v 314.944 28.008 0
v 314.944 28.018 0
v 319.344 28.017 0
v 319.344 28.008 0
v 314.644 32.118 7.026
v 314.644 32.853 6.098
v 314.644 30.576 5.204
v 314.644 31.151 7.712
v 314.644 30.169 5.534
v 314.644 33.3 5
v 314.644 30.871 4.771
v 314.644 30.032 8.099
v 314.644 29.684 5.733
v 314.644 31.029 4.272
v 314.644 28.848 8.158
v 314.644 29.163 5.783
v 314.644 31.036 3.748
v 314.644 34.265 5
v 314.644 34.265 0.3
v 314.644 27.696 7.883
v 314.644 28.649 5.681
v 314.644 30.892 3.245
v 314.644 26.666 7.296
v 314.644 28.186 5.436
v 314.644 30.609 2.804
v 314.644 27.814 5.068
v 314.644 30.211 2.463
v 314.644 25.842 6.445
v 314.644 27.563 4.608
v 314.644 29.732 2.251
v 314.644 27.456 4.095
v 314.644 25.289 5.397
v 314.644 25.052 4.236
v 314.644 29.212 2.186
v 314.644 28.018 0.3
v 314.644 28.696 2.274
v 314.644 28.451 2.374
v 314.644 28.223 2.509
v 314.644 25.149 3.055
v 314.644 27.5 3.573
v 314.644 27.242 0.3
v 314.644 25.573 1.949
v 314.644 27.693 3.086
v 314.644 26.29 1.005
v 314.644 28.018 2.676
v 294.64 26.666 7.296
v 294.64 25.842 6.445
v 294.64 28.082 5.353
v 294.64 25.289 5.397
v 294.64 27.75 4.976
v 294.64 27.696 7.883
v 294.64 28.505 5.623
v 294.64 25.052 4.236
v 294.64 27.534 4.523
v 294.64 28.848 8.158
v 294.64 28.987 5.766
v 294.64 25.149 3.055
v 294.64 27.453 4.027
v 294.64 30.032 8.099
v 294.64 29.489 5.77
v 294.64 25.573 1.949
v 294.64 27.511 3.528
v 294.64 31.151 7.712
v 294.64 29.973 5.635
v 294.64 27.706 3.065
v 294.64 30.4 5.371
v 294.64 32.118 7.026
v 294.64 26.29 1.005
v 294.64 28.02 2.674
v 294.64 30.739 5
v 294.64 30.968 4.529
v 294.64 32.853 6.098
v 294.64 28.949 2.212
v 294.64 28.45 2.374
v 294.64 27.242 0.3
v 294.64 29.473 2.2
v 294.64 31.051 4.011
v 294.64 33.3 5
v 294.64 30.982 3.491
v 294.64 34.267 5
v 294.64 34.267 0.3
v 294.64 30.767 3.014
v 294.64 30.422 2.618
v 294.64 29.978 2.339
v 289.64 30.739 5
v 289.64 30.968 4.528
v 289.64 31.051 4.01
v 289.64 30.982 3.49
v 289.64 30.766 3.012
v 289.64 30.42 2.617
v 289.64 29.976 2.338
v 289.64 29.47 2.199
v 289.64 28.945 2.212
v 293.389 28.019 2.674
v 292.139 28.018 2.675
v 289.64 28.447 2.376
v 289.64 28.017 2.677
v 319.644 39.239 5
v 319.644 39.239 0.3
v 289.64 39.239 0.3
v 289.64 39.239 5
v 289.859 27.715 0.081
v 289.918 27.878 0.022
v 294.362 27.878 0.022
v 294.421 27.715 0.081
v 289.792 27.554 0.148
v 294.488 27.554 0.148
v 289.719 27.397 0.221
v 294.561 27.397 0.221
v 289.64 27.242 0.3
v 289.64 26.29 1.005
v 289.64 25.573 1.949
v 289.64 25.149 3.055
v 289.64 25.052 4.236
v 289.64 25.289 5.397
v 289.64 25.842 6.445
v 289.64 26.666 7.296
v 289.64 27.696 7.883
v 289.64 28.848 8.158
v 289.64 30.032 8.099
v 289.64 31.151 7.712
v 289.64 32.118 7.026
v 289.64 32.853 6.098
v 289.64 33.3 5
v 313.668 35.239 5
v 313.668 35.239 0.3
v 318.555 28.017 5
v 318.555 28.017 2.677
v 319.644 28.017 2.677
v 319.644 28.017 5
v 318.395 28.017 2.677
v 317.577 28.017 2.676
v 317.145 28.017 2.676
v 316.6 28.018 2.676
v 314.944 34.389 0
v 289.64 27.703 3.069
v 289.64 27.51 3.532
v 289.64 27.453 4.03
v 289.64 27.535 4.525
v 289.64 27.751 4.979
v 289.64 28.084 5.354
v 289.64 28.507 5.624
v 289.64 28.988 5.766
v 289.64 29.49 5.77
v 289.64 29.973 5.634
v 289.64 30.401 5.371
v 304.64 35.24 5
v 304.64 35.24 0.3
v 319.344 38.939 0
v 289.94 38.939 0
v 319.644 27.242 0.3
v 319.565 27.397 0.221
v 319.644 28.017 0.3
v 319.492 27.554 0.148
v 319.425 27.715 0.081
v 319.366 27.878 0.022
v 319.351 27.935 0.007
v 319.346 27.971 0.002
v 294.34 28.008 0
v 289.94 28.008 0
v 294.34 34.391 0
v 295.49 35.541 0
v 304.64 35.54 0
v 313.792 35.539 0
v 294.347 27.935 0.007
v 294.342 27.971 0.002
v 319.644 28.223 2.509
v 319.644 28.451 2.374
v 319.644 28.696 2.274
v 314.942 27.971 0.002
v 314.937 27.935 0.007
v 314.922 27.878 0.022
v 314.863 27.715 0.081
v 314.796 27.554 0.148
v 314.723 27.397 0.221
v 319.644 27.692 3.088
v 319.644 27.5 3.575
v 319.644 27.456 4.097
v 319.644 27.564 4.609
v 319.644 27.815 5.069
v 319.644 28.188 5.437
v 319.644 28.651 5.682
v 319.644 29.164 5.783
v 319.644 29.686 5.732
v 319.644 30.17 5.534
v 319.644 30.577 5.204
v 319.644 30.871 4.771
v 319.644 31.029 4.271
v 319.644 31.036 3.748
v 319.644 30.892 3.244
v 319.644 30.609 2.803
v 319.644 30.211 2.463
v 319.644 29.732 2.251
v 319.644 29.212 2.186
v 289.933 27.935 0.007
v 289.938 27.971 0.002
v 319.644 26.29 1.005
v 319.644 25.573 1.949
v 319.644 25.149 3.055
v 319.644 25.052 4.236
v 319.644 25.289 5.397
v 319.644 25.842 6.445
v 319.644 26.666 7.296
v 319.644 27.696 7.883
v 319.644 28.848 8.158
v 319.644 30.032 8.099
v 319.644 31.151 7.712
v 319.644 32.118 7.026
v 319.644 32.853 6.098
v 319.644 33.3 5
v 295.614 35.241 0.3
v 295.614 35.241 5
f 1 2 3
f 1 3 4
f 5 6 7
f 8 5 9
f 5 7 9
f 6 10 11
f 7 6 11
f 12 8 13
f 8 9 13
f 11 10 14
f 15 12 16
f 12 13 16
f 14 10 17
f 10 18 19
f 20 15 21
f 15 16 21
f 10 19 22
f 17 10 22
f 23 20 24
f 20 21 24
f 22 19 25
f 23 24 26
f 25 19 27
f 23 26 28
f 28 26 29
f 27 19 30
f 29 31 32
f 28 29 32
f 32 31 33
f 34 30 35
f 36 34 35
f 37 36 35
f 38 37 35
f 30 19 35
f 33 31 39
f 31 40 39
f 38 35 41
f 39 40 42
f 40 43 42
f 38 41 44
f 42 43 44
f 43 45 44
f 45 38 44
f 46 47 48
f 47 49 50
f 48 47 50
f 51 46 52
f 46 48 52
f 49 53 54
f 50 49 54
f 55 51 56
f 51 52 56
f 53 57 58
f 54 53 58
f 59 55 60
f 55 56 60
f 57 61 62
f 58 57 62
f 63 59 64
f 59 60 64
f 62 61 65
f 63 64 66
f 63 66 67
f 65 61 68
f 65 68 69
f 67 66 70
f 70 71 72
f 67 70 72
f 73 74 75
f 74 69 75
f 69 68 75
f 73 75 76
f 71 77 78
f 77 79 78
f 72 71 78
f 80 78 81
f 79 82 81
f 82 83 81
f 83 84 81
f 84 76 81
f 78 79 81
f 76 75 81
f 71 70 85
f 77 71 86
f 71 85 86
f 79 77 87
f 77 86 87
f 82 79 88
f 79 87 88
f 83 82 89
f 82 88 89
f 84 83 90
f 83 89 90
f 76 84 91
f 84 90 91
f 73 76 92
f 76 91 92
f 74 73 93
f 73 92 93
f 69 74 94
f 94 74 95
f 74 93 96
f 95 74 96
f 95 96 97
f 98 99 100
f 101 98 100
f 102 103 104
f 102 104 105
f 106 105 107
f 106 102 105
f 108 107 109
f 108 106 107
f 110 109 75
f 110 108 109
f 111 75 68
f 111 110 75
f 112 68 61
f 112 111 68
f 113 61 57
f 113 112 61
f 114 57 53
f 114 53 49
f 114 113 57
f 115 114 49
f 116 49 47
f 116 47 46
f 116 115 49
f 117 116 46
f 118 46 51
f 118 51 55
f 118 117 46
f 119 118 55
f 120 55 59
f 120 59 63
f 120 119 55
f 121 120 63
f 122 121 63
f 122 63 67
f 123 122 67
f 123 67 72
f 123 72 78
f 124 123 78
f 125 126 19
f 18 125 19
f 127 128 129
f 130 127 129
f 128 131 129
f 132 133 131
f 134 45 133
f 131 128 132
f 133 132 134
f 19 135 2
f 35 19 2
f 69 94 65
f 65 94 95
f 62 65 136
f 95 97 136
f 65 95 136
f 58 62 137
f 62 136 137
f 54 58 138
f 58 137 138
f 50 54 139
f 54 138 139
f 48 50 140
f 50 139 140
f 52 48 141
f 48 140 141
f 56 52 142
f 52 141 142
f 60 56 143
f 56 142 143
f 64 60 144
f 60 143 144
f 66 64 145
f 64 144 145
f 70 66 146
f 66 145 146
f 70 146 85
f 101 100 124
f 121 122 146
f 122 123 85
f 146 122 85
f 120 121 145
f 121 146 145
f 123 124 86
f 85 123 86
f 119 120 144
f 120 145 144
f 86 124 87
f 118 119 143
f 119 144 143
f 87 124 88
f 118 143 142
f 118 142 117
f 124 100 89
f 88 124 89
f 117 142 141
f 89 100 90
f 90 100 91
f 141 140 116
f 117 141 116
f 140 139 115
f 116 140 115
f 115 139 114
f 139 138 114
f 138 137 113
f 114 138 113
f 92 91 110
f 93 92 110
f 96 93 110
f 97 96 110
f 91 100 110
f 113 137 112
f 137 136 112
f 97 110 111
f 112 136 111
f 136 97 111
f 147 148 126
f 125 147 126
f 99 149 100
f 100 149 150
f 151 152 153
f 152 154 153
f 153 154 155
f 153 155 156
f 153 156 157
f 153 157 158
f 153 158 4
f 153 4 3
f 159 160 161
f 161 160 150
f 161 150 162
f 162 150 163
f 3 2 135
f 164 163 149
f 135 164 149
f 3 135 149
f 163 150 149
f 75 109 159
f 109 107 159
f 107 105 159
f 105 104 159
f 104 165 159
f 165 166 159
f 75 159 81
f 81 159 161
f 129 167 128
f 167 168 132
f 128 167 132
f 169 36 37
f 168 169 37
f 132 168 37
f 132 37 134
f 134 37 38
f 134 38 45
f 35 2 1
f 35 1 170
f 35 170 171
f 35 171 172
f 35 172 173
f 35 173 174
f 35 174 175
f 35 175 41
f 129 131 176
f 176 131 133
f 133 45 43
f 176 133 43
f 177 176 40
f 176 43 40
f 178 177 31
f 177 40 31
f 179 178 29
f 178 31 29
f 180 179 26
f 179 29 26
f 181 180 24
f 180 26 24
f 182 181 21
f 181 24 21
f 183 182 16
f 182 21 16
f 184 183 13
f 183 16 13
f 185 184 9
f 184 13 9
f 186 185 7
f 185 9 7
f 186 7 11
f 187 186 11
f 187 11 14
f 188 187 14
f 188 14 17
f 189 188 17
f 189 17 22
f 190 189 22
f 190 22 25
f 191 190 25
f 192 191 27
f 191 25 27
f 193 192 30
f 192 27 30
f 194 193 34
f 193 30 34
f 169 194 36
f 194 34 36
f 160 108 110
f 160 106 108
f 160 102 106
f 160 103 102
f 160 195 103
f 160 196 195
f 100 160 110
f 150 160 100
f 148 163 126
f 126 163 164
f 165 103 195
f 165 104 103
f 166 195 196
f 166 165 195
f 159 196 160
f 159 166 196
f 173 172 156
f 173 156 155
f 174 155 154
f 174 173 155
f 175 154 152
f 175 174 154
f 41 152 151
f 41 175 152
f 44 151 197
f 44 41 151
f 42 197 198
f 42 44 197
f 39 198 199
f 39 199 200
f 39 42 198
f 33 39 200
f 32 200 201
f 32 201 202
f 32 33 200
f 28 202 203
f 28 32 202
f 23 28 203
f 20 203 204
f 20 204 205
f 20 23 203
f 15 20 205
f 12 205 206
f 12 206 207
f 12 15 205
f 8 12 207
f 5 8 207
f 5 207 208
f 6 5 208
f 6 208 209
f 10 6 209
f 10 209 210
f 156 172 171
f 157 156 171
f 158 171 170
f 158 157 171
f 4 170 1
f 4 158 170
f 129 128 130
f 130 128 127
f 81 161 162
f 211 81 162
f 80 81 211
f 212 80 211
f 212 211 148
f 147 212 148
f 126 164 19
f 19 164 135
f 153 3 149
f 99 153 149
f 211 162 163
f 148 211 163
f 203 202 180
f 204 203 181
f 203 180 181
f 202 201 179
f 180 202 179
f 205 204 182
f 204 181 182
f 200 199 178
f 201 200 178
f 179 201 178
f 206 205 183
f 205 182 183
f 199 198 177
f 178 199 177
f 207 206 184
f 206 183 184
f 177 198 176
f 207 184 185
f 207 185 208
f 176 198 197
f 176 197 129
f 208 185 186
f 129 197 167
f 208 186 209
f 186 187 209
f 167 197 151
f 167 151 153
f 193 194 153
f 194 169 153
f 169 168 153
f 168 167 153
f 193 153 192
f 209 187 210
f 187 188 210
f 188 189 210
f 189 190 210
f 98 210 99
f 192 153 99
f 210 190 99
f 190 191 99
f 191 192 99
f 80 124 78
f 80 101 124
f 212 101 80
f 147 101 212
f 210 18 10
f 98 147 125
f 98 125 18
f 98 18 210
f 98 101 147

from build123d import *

# Parameters (mm, degrees)
BOSS_EXTRUDE1_DEPTH = 5
CUT_EXTRUDE1_DEPTH  = 31.003999108
SKETCH2_3_R         = 1.799674582
BOSS_EXTRUDE2_DEPTH = 5
SKETCH3_R           = 1.799674582
BOSS_EXTRUDE3_DEPTH = 5
CHAMFER1_SIZE       = 0.3
FILLET1_R           = 0.4


with BuildPart() as part:
    # Model → Boss-Extrude1 (new body)
    with BuildSketch(Plane.XY):
        Polygon((294.639989597, 34.266605248), (295.614474597, 35.240900181), (304.640051213, 35.240024382), (313.667685024, 35.239144856), (314.643988705, 34.264659856), (314.643988705, 28.018126256), (319.643988705, 28.016541689), (319.643988705, 39.239445651), (289.639989597, 39.239424468), (289.639989597, 28.016886869), (294.639989597, 28.020075702), align=None)
    extrude(amount=BOSS_EXTRUDE1_DEPTH)

    # Sketch2 → Cut-Extrude1 (cut, through all)
    with BuildSketch(Plane.ZY.offset(-289.639989597)):
        with BuildLine():
            ThreePointArc((5, 30.738550482), (2.616874768, 30.420409758), (2.676683755, 28.016886869))
            Line((2.676683755, 28.016886869), (5, 28.016886869))
            Line((5, 28.016886869), (5, 30.738550482))
        make_face()
    extrude(amount=-CUT_EXTRUDE1_DEPTH, mode=Mode.SUBTRACT)

    # Sketch2<3> → Boss-Extrude2 (add)
    with BuildSketch(Plane.ZY.offset(-289.639989597)):
        with BuildLine():
            Line((0, 30.526457448), (0, 27.942741433))
            ThreePointArc((0, 27.942741433), (8.175740848, 29.23459944), (0, 30.526457448))
        make_face()
        with Locations((3.985657063, 29.251964795)):
            Circle(SKETCH2_3_R, mode=Mode.SUBTRACT)
    extrude(amount=-BOSS_EXTRUDE2_DEPTH)

    # Sketch3 → Boss-Extrude3 (add)
    with BuildSketch(Plane.ZY.offset(-314.643988705)):
        with BuildLine():
            Line((4.35e-07, 30.526456106), (4.35e-07, 27.942740092))
            ThreePointArc((4.35e-07, 27.942740092), (8.175741283, 29.234598099), (4.35e-07, 30.526456106))
        make_face()
        with Locations((3.985657498, 29.251963453)):
            Circle(SKETCH3_R, mode=Mode.SUBTRACT)
    extrude(amount=-BOSS_EXTRUDE3_DEPTH)

    # Chamfer1
    chamfer1_edges = [part.edges().sort_by_distance(p)[0] for p in [
        (294.639989597, 31.104673341, 0),
        (289.639989597, 33.59108295, 0),
        (304.641989151, 39.239435059, 0),
        (319.643988705, 33.62799367, 0),
        (314.643988705, 31.141393056, 0),
        (314.155836865, 34.751902356, 0),
        (309.153868118, 35.239584619, 0),
        (300.127262905, 35.240462282, 0),
        (295.127232097, 34.753752715, 0),
    ]]
    chamfer(chamfer1_edges, length=CHAMFER1_SIZE)

    # Fillet1
    fillet1_edges = [part.edges().sort_by_distance(p)[0] for p in [
        (317.143988705, 27.942740092, 4.35e-07),
        (292.139989597, 27.942741433, 0),
    ]]
    fillet(fillet1_edges, radius=FILLET1_R)


solid = part.part
